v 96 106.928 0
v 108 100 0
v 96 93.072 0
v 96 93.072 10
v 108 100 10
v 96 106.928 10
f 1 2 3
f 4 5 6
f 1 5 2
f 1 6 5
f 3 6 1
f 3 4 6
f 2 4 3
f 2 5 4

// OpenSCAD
linear_extrude(height = 10) {
  translate([0, 100, 0]) {
    translate([100, 0, 0]) {
      circle(r = 8, $fn = 3);
    }
  }
}
$fn = 50;
